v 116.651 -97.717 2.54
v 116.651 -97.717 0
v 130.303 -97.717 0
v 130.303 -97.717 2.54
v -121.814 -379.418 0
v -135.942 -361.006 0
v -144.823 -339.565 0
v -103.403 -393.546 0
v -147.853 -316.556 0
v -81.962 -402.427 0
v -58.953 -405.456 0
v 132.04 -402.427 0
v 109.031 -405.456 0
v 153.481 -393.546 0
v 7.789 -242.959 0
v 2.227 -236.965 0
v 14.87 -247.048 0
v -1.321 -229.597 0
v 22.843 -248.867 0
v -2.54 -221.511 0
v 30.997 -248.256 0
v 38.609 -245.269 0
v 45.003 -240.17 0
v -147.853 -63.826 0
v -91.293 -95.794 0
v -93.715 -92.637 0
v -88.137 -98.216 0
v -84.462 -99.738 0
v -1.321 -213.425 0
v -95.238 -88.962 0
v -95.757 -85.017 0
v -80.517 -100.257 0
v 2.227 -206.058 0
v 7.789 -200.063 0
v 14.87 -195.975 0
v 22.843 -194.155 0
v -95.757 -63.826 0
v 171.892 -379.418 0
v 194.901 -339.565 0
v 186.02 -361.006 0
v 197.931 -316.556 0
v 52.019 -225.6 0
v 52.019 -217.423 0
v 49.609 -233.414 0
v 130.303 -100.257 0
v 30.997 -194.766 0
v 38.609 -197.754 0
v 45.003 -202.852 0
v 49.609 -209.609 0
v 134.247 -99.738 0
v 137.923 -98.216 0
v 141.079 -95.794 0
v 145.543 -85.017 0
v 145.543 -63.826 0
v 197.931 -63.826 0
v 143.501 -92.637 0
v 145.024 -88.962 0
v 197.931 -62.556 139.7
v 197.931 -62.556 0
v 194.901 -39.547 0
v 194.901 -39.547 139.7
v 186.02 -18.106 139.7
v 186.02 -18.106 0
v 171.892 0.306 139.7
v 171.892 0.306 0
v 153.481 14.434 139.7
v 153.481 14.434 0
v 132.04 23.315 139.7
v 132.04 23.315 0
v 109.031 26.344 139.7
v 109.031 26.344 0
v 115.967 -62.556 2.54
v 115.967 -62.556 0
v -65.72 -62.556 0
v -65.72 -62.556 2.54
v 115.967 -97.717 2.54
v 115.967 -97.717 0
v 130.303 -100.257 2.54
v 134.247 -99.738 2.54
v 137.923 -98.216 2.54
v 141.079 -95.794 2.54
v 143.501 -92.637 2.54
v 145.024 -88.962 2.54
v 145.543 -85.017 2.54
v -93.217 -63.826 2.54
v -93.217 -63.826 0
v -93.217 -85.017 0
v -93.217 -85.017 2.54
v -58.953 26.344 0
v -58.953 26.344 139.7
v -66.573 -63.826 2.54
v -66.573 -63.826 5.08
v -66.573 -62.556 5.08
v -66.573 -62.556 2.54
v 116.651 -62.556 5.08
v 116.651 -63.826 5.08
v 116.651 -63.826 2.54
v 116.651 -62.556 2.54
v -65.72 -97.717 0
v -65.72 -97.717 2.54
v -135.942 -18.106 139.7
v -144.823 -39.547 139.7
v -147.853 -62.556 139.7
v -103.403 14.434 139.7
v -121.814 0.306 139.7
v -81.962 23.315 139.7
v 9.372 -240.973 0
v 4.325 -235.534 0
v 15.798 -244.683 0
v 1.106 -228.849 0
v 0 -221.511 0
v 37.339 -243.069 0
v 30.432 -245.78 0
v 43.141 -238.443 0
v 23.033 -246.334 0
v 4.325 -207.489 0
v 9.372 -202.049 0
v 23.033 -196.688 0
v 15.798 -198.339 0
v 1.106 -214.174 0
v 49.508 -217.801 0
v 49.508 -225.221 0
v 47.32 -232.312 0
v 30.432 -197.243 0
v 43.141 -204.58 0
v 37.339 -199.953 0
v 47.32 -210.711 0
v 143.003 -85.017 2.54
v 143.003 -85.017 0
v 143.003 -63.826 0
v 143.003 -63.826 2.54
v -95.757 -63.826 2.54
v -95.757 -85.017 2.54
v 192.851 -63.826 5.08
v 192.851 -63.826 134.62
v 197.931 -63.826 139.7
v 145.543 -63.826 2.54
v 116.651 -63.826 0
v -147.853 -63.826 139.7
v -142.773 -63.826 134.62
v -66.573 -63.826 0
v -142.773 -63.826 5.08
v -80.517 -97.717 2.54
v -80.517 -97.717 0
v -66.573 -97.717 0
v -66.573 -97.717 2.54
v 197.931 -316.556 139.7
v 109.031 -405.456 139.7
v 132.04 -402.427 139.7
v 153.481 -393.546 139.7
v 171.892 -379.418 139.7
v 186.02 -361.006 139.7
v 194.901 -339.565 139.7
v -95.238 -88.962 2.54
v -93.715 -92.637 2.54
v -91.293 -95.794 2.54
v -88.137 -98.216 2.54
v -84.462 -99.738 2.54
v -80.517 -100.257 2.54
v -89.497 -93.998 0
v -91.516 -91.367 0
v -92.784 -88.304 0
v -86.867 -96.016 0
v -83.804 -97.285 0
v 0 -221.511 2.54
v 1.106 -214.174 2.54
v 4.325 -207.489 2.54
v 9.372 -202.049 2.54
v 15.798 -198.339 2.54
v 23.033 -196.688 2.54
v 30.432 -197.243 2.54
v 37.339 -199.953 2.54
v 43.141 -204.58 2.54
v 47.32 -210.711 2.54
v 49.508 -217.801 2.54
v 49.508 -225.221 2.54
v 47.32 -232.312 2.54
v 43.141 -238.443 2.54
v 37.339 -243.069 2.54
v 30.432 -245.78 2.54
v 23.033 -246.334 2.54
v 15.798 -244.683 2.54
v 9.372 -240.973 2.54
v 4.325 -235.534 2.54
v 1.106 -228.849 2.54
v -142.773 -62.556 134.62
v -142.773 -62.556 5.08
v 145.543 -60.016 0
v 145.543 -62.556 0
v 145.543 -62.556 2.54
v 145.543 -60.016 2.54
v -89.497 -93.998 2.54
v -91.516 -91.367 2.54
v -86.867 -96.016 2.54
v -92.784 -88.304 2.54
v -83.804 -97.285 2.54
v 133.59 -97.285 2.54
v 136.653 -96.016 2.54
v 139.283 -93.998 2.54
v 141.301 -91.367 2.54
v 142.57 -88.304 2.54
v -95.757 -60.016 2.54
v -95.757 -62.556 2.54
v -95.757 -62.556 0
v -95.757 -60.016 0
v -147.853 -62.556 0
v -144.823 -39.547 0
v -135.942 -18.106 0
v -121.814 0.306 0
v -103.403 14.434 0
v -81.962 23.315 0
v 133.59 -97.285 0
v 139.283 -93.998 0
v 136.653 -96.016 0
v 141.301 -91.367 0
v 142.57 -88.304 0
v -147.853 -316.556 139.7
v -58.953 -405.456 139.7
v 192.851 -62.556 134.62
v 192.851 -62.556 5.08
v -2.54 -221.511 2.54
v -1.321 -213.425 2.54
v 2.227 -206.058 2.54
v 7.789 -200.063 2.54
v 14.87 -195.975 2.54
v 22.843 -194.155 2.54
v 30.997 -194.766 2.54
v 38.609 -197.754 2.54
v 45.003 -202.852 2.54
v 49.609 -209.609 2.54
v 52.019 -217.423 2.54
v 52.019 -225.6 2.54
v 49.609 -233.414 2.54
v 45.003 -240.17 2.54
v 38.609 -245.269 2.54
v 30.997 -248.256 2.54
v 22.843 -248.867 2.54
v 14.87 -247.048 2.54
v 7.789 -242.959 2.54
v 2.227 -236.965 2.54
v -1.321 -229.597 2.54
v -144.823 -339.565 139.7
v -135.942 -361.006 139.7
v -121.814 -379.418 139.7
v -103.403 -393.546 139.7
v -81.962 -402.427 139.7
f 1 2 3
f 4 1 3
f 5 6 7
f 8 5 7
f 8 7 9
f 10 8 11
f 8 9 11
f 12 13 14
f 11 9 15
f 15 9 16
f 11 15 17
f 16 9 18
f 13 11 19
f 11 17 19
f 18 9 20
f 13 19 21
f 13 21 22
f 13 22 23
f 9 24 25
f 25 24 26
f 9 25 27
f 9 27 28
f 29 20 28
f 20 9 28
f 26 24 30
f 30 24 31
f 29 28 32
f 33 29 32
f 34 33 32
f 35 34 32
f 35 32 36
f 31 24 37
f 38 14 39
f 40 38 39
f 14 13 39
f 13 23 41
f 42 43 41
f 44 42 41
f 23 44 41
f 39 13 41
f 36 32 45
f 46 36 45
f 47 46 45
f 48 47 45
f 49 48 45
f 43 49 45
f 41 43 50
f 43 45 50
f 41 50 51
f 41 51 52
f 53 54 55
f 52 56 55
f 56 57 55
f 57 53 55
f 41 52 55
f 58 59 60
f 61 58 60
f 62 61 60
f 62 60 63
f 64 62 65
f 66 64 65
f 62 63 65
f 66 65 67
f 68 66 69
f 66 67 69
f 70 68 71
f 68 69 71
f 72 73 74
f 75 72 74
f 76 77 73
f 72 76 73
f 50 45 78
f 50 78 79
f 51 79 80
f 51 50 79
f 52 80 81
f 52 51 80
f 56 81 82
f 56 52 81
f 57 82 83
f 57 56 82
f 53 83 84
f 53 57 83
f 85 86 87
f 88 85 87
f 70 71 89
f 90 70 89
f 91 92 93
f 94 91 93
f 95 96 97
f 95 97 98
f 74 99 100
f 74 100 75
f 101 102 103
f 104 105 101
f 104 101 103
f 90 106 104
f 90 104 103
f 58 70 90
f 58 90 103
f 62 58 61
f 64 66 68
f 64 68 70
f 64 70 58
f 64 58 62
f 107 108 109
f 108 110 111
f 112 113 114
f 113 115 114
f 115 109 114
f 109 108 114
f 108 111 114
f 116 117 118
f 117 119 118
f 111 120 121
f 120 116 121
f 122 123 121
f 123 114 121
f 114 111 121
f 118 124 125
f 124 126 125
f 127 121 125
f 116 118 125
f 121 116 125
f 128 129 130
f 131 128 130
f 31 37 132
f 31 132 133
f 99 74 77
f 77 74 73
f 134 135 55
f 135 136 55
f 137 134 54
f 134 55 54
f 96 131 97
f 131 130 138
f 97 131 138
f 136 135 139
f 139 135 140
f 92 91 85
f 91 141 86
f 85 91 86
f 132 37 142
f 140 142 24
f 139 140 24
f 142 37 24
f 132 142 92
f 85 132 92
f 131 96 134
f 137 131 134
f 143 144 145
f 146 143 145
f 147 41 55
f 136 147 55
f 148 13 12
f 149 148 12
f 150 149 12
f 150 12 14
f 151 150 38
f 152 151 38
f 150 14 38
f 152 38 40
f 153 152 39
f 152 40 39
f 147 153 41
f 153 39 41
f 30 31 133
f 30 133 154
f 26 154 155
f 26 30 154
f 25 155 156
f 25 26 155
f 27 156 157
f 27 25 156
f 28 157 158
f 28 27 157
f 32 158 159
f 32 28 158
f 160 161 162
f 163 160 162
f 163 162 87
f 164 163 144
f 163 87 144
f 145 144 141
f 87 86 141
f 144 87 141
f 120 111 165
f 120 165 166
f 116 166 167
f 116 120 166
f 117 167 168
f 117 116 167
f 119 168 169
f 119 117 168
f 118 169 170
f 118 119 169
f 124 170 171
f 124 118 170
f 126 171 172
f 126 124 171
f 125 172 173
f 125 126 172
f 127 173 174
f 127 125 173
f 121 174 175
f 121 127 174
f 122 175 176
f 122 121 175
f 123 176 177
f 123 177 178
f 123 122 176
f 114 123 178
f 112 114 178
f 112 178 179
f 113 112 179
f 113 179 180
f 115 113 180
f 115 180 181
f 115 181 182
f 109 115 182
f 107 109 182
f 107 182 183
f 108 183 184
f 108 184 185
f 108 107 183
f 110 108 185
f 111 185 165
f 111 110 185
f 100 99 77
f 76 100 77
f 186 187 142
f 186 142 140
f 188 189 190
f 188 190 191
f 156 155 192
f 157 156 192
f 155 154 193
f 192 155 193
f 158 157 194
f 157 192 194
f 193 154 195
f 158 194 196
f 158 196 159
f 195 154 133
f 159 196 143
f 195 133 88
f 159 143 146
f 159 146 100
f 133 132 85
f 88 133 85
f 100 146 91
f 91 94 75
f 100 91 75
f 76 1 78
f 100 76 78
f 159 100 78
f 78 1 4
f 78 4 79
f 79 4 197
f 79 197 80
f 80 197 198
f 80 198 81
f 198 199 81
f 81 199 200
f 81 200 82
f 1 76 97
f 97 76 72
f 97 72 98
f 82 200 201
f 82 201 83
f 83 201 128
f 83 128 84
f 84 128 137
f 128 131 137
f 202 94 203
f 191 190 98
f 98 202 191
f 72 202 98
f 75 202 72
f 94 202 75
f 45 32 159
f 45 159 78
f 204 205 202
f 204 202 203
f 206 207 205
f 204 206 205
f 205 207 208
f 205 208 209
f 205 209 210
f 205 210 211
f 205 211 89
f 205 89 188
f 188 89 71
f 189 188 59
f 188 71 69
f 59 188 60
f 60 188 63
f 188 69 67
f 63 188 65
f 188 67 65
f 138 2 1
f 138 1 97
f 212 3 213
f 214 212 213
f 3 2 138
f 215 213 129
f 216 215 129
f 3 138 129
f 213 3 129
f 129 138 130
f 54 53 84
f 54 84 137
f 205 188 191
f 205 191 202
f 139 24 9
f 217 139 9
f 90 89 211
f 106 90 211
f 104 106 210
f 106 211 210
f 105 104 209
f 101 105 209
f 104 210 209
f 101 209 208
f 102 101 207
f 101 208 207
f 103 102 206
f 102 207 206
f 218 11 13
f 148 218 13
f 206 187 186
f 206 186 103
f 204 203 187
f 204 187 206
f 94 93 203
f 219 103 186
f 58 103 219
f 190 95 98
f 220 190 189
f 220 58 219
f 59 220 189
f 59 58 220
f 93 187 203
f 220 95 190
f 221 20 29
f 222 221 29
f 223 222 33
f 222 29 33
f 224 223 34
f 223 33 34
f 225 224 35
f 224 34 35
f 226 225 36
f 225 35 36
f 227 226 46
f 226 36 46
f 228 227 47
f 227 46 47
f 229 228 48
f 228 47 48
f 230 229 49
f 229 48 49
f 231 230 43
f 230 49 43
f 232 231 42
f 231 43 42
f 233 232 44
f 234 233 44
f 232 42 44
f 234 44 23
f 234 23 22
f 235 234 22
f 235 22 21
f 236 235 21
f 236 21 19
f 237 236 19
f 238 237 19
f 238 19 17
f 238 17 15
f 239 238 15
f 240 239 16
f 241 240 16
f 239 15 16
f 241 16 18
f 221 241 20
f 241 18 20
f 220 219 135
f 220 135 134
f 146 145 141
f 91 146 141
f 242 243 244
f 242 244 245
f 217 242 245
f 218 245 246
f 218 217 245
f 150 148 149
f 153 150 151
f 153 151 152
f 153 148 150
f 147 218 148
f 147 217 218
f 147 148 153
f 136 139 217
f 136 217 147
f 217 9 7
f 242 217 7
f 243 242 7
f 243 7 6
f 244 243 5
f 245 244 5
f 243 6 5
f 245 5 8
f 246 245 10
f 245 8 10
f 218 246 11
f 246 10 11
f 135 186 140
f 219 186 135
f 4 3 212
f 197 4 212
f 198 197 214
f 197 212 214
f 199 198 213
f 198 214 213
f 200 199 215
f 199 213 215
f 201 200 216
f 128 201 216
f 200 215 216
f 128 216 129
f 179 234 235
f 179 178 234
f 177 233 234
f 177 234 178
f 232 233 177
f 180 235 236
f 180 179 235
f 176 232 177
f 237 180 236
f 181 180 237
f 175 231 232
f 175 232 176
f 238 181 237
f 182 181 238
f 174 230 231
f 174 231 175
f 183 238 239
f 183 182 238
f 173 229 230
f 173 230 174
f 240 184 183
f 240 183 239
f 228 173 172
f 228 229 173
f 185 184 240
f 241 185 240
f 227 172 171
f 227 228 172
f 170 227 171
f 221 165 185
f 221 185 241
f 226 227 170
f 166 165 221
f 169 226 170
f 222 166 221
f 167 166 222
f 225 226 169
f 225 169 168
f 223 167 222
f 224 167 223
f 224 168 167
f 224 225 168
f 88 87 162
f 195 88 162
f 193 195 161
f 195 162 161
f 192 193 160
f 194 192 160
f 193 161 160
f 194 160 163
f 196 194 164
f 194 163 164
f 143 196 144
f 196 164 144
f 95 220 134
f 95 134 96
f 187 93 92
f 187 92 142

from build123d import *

# Parameters (mm, degrees)
BOSS_EXTRUDE1_DEPTH     = 139.7
SKETCH2_W               = 345.783161942
SKETCH2_H               = 1.27
CUT_EXTRUDE1_DEPTH      = 5.08
SKETCH3_W               = 134.62
SKETCH3_H               = 1.27
CUT_EXTRUDE2_DEPTH      = 5.08
SKETCH4_W               = 134.62
SKETCH4_H               = 1.27
CUT_EXTRUDE3_DEPTH      = 5.08
SKETCH5_W               = 76.2
SKETCH5_H               = 1.27
CUT_EXTRUDE4_DEPTH      = 5.08
CUT_EXTRUDE_THIN1_DEPTH = 2.54
SKETCH8_W               = 0.683613246
SKETCH8_H               = 35.161225601
SKETCH8_W_2             = 0.852269187
CUT_EXTRUDE5_DEPTH      = 2.54
SKETCH9_R               = 27.432823907
SKETCH9_R_2             = 24.892823907
CUT_EXTRUDE_THIN2_DEPTH = 2.54


with BuildPart() as part:
    # Sketch1 → Boss-Extrude1 (new body)
    with BuildSketch(Plane.XY):
        with BuildLine():
            Line((109.030585849, 26.343843493), (-58.952576093, 26.343843493))
            ThreePointArc((-58.952576093, 26.343843493), (-121.814368941, 0.30563634), (-147.852576093, -62.556156507))
            Line((-147.852576093, -62.556156507), (-147.852576093, -316.556156507))
            ThreePointArc((-147.852576093, -316.556156507), (-121.814368941, -379.417949355), (-58.952576093, -405.456156507))
            Line((-58.952576093, -405.456156507), (109.030585849, -405.456156507))
            ThreePointArc((109.030585849, -405.456156507), (171.892378697, -379.417949355), (197.930585849, -316.556156507))
            Line((197.930585849, -316.556156507), (197.930585849, -62.556156507))
            ThreePointArc((197.930585849, -62.556156507), (171.892378697, 0.30563634), (109.030585849, 26.343843493))
        make_face()
    extrude(amount=BOSS_EXTRUDE1_DEPTH)

    # Sketch2 → Cut-Extrude1 (cut)
    with BuildSketch(Plane.XY.offset(139.7)):
        with Locations((25.039004878, -63.191156507)):
            Rectangle(SKETCH2_W, SKETCH2_H)
    extrude(amount=-CUT_EXTRUDE1_DEPTH, mode=Mode.SUBTRACT)

    # Sketch3 → Cut-Extrude2 (cut)
    with BuildSketch(Plane.ZY.offset(147.852576093)):
        with Locations((67.31, -63.191156507)):
            Rectangle(SKETCH3_W, SKETCH3_H)
    extrude(amount=-CUT_EXTRUDE2_DEPTH, mode=Mode.SUBTRACT)

    # Sketch4 → Cut-Extrude3 (cut)
    with BuildSketch(Plane(origin=(197.930585849, 0, 0), x_dir=(0, 0, -1), z_dir=(1, 0, 0))):
        with Locations((-67.31, -63.191156507)):
            Rectangle(SKETCH4_W, SKETCH4_H)
    extrude(amount=-CUT_EXTRUDE3_DEPTH, mode=Mode.SUBTRACT)

    # Sketch5 → Cut-Extrude4 (cut)
    with BuildSketch(Plane(origin=(0, 0, 0), x_dir=(-1, 0, 0), z_dir=(0, 0, -1))):
        with Locations((-154.750585849, -63.191156507)):
            Rectangle(SKETCH5_W, SKETCH5_H)
        with Locations((104.672576093, -63.191156507)):
            Rectangle(SKETCH5_W, SKETCH5_H)
    extrude(amount=-CUT_EXTRUDE4_DEPTH, mode=Mode.SUBTRACT)

    # Sketch7 → Cut-Extrude-Thin1 (cut)
    with BuildSketch(Plane(origin=(0, 0, 0), x_dir=(-1, 0, 0), z_dir=(0, 0, -1))):
        with BuildLine():
            Line((80.517176093, -100.257382108), (-130.302823907, -100.257382108))
            ThreePointArc((-130.302823907, -100.257382108), (-141.079131252, -95.793689453), (-145.542823907, -85.017382108))
            Line((-145.542823907, -85.017382108), (-145.542823907, -63.826156507))
            Line((-145.542823907, -63.826156507), (-145.542823907, -60.016156507))
            Line((-145.542823907, -60.016156507), (95.757176093, -60.016156507))
            Line((95.757176093, -60.016156507), (95.757176093, -63.826156507))
            Line((95.757176093, -63.826156507), (95.757176093, -85.017382108))
            ThreePointArc((95.757176093, -85.017382108), (91.293483439, -95.793689453), (80.517176093, -100.257382108))
        make_face()
        with BuildLine():
            Line((80.517176093, -97.717382108), (-130.302823907, -97.717382108))
            ThreePointArc((-130.302823907, -97.717382108), (-139.283080028, -93.997638229), (-143.002823907, -85.017382108))
            Line((-143.002823907, -85.017382108), (-143.002823907, -63.826156507))
            Line((-143.002823907, -63.826156507), (-143.002823907, -62.556156507))
            Line((-143.002823907, -62.556156507), (93.217176093, -62.556156507))
            Line((93.217176093, -62.556156507), (93.217176093, -63.826156507))
            Line((93.217176093, -63.826156507), (93.217176093, -85.017382108))
            ThreePointArc((93.217176093, -85.017382108), (89.497432214, -93.997638229), (80.517176093, -97.717382108))
        make_face(mode=Mode.SUBTRACT)
    extrude(amount=-CUT_EXTRUDE_THIN1_DEPTH, mode=Mode.SUBTRACT)

    # Sketch8 → Cut-Extrude5 (cut)
    with BuildSketch(Plane(origin=(0, 0, 0), x_dir=(-1, 0, 0), z_dir=(0, 0, -1))):
        with Locations((-116.308779226, -80.136769308)):
            Rectangle(SKETCH8_W, SKETCH8_H)
        with Locations((66.1464415, -80.136769308)):
            Rectangle(SKETCH8_W_2, SKETCH8_H)
    extrude(amount=-CUT_EXTRUDE5_DEPTH, mode=Mode.SUBTRACT)

    # Sketch9 → Cut-Extrude-Thin2 (cut)
    with BuildSketch(Plane(origin=(0, 0, 0), x_dir=(-1, 0, 0), z_dir=(0, 0, -1))):
        with Locations((-24.892823907, -221.511266295)):
            Circle(SKETCH9_R)
        with Locations((-24.892823907, -221.511266295)):
            Circle(SKETCH9_R_2, mode=Mode.SUBTRACT)
    extrude(amount=-CUT_EXTRUDE_THIN2_DEPTH, mode=Mode.SUBTRACT)


solid = part.part
